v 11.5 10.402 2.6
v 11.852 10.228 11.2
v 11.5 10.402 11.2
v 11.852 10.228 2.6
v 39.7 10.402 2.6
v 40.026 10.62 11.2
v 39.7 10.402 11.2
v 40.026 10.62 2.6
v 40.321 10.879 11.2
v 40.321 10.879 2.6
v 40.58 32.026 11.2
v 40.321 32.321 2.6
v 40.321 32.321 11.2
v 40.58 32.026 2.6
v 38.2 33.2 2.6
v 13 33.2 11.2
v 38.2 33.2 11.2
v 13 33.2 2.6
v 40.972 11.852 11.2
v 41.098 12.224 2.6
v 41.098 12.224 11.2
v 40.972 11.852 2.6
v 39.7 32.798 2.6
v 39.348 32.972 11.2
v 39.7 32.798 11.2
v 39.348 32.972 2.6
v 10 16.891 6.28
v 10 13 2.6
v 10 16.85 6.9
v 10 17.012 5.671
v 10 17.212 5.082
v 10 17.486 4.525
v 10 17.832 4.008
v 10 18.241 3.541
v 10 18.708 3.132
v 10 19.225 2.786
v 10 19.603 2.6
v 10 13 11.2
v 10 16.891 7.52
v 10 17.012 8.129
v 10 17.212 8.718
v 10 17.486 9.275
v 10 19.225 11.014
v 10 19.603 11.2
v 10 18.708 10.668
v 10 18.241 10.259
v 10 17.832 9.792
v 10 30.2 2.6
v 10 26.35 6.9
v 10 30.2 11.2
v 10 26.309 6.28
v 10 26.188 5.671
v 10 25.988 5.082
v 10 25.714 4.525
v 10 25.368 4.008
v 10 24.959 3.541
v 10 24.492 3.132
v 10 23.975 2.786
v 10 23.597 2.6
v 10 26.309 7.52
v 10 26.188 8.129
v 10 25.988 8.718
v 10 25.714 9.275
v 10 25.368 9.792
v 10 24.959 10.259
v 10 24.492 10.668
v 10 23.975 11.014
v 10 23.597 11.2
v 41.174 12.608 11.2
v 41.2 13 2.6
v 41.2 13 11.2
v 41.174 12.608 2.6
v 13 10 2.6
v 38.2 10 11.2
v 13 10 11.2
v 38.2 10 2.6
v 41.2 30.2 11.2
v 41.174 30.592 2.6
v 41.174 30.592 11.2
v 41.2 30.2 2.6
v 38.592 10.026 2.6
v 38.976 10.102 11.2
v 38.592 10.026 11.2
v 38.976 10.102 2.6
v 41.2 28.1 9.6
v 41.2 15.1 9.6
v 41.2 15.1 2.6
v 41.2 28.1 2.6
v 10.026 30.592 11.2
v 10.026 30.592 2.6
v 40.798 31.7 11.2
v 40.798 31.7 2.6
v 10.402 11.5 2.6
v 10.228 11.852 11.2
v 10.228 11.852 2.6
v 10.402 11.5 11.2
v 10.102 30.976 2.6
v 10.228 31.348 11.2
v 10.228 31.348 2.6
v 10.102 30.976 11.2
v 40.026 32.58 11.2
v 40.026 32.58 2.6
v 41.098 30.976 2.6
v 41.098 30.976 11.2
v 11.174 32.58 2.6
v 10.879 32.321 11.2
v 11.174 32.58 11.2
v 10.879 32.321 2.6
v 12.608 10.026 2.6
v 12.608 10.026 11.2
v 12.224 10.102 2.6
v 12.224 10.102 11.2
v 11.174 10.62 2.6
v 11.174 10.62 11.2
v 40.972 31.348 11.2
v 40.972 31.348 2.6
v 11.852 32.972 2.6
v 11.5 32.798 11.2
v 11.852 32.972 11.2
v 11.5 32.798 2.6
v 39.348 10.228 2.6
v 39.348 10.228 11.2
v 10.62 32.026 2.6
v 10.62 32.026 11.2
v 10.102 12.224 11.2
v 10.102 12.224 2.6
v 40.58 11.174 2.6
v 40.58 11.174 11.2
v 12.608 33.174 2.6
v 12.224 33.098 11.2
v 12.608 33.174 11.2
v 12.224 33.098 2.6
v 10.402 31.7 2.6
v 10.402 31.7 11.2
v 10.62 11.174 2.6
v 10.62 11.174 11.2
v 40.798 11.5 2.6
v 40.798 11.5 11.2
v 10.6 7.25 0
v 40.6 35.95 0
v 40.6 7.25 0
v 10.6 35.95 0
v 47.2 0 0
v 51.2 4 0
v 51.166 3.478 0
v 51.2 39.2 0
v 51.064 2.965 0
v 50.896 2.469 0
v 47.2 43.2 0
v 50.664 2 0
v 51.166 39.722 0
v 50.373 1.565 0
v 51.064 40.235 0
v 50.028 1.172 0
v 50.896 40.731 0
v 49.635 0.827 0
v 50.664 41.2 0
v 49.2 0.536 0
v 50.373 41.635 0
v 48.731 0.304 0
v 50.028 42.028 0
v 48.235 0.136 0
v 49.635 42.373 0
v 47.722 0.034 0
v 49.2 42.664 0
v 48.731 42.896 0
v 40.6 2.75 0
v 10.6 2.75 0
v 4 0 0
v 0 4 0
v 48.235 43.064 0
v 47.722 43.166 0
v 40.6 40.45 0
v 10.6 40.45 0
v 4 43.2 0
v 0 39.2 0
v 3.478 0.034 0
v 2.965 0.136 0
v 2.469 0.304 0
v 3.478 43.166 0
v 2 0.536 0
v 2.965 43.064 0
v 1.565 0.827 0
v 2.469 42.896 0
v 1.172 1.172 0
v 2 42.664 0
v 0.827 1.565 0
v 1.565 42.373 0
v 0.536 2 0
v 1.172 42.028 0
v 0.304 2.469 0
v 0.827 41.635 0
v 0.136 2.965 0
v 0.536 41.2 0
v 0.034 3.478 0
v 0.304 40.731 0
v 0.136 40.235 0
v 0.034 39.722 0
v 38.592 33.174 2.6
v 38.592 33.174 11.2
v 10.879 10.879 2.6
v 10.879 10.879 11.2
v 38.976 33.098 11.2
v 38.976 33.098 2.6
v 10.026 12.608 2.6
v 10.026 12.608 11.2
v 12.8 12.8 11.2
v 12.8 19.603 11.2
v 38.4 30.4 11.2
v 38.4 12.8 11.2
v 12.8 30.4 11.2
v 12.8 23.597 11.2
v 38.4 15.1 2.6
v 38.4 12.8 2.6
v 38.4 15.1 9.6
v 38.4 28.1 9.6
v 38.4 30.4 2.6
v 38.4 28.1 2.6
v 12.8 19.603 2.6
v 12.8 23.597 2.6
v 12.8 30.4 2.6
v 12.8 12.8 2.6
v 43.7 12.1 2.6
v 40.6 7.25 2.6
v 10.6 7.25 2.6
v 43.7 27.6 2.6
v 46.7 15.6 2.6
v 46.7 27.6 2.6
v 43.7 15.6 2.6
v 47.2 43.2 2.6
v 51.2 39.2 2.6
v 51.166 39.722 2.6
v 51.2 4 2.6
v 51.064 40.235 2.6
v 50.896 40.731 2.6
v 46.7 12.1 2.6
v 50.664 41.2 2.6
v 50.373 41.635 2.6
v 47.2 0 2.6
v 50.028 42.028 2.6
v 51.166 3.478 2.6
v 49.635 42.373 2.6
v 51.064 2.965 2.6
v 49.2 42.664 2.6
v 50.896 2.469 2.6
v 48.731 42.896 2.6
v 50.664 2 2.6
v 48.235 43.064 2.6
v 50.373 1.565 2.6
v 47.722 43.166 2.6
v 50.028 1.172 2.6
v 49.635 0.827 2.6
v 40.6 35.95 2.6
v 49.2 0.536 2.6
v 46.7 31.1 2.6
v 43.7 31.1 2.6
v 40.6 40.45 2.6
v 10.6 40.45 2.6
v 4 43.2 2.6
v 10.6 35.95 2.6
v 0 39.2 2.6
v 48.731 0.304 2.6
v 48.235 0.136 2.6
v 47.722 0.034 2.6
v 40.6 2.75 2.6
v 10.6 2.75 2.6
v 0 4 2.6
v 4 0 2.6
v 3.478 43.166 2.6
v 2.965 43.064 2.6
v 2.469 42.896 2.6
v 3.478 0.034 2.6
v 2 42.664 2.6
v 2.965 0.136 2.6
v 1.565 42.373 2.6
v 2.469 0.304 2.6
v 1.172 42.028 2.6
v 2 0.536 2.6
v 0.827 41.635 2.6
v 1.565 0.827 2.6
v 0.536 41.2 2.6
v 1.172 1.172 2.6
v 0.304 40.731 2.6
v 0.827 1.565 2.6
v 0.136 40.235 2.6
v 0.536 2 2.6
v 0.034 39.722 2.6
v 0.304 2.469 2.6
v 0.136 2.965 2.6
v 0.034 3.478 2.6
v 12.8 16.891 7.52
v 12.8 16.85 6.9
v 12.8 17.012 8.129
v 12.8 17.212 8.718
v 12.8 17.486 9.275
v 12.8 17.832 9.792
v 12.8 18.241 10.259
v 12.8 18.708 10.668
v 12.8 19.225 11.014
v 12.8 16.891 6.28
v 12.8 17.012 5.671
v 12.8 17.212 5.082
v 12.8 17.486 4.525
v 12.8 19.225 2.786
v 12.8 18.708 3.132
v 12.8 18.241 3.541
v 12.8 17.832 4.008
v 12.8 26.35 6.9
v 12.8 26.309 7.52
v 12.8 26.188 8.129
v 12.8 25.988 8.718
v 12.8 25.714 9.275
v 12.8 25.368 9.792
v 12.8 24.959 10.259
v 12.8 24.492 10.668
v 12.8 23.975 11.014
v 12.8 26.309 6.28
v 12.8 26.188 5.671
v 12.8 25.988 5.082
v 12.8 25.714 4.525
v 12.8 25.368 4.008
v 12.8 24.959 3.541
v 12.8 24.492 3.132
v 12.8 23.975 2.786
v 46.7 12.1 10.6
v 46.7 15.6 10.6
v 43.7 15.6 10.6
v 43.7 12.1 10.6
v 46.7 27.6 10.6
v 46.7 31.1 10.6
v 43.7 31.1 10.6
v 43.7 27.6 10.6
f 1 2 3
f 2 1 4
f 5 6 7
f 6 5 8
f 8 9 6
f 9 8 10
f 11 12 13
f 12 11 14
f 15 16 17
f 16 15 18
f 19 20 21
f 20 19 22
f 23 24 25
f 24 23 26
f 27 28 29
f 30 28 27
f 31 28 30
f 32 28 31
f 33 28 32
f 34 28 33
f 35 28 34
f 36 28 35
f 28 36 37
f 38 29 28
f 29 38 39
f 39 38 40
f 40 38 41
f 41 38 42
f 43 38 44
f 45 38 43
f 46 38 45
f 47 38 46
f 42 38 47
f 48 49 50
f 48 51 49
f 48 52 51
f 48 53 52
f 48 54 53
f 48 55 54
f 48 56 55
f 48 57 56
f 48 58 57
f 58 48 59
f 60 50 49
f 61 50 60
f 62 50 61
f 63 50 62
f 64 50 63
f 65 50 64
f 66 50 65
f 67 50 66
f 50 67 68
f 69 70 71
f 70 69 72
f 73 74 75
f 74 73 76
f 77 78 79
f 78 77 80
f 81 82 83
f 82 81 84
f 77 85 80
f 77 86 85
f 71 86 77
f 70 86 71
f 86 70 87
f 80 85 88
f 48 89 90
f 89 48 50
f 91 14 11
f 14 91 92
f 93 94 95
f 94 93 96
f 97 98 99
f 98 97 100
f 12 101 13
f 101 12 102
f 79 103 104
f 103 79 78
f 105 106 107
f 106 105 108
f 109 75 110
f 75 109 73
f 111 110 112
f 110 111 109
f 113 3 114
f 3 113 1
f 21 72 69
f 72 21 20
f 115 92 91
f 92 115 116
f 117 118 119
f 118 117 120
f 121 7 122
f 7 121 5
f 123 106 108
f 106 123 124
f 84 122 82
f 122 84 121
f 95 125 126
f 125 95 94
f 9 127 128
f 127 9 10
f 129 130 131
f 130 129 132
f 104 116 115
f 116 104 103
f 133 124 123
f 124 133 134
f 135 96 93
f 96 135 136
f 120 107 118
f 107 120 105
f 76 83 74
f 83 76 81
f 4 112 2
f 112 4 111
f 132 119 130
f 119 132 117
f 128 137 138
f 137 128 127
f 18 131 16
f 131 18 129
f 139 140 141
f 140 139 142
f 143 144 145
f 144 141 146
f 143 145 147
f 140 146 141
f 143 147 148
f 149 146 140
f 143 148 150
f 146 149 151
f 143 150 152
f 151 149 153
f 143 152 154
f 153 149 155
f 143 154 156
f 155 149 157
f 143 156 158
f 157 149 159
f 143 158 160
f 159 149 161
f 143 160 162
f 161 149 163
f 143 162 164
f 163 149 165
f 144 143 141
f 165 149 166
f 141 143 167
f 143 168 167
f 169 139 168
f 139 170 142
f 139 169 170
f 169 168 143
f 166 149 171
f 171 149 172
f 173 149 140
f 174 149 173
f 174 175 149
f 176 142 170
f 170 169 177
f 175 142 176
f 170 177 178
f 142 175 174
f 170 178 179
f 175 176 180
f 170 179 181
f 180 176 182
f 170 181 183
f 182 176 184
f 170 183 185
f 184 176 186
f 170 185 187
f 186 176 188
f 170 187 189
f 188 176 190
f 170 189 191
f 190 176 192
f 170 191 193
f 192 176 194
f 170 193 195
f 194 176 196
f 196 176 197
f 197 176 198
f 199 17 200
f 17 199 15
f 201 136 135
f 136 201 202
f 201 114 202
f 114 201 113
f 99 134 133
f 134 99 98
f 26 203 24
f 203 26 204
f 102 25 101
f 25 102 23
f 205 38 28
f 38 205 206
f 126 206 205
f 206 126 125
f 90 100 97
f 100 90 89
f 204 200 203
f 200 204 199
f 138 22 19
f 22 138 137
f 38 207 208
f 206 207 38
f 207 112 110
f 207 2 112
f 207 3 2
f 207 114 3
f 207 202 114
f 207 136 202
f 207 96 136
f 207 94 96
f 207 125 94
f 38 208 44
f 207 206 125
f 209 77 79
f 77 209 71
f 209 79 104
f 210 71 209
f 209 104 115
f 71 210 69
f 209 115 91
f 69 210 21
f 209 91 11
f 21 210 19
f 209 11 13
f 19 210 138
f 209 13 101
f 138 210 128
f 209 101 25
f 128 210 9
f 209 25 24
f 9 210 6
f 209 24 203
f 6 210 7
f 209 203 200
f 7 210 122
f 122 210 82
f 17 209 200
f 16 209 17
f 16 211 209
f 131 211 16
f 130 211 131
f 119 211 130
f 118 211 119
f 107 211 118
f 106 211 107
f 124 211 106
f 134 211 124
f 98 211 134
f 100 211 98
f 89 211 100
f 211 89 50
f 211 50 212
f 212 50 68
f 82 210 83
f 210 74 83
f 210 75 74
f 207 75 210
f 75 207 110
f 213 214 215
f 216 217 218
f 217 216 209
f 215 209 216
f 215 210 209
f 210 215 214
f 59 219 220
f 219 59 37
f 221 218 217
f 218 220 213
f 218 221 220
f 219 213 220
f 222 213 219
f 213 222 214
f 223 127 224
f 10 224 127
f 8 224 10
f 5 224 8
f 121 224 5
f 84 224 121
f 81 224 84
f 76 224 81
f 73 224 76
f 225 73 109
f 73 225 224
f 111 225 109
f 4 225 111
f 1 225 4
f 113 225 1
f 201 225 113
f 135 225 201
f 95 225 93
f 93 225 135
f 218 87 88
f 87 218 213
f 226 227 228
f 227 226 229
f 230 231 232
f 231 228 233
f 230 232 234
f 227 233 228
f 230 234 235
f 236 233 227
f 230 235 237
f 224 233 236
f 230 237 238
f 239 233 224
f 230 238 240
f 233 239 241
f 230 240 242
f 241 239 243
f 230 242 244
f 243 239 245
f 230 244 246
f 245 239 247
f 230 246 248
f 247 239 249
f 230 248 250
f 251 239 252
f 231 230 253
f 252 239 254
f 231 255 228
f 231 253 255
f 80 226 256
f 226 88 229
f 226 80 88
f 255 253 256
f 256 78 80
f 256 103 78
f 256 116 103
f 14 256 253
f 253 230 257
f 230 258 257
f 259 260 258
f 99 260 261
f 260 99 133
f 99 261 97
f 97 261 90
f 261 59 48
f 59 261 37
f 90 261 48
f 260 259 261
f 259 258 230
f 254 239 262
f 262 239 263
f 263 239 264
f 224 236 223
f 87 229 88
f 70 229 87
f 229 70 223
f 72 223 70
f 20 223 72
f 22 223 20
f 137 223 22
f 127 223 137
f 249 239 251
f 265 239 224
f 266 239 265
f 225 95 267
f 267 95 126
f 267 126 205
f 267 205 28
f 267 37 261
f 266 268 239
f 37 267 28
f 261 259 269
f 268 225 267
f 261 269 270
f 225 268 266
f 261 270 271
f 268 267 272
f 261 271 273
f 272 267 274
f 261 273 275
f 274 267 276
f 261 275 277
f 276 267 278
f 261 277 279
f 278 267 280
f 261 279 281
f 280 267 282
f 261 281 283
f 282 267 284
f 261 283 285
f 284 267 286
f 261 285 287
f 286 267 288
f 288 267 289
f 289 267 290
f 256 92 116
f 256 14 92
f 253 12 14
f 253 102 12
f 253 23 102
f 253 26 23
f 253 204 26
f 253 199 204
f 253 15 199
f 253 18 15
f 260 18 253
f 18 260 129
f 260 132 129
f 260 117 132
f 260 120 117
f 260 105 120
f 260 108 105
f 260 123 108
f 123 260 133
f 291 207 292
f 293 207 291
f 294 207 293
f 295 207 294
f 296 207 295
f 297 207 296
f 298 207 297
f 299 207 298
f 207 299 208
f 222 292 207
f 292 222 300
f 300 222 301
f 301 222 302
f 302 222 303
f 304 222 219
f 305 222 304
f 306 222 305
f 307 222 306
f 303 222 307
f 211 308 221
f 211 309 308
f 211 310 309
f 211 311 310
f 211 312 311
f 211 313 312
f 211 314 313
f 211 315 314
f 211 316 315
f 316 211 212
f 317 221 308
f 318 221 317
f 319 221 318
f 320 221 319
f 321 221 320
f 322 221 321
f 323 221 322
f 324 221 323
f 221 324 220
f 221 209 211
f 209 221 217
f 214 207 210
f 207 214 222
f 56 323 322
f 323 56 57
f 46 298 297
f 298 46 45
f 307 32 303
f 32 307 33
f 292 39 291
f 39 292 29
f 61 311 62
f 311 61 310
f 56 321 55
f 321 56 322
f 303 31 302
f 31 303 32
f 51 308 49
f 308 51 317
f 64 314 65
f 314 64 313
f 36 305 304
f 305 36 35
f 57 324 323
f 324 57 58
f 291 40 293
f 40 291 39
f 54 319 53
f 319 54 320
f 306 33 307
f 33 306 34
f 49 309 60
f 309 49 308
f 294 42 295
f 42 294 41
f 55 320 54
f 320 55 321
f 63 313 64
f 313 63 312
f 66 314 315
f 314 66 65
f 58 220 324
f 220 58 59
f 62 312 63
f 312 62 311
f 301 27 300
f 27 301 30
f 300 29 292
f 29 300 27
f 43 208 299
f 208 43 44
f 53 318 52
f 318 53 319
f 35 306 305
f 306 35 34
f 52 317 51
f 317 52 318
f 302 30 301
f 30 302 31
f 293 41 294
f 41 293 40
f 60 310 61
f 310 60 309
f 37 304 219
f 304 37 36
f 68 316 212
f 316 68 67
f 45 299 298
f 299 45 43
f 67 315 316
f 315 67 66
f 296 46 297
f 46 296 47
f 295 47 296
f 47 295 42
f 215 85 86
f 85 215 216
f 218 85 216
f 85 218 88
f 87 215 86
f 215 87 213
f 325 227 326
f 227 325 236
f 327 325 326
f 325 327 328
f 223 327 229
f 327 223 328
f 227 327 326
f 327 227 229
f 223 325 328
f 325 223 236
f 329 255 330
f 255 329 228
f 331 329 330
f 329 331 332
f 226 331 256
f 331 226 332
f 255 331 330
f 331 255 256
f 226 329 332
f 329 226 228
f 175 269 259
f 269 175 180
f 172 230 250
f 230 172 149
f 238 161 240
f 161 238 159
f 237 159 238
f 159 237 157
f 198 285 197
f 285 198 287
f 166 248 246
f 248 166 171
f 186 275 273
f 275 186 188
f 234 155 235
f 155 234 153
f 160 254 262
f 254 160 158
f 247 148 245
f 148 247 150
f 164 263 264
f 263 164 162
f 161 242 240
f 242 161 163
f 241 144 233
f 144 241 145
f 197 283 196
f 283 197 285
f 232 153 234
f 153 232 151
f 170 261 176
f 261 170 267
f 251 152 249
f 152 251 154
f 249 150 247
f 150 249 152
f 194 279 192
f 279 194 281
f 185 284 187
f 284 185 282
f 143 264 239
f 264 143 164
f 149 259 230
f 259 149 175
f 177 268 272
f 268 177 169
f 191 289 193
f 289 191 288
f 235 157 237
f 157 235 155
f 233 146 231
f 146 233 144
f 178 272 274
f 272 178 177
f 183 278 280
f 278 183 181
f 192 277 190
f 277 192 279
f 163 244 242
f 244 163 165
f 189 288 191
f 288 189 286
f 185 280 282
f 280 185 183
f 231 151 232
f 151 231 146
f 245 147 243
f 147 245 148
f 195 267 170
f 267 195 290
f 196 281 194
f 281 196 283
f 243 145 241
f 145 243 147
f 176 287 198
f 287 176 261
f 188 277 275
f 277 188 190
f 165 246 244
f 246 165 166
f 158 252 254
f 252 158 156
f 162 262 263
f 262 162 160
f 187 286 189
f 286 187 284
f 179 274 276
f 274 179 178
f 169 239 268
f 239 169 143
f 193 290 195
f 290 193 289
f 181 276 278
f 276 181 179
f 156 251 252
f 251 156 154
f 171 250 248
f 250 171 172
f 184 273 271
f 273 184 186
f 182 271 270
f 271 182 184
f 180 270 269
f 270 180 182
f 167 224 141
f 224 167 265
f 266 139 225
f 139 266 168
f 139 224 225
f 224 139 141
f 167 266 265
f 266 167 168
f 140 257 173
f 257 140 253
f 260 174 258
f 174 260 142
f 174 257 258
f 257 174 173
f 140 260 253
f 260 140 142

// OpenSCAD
// ============================================================
//  CORVUS SENTINEL — Rugged SDR Cradle (parametric)
//  Holds a Nooelec NESDR Nano 3 and straps/zip-ties to your phone
//  or rugged case. Open shell + USB cable strain relief so a knock
//  on the antenna won't snap the phone's USB-C port.
//
//  USE: install OpenSCAD (free, openscad.org). Open this file.
//  VERIFY the three dongle dims below with calipers, press F6 to
//  render, then File > Export > Export as STL.
//  PRINT: TPU 95A (best impact resistance) or PETG. 3+ walls,
//  ~30% infill, no supports needed (open top).
// ============================================================

/* ---- 1) MEASURE YOUR DONGLE, in mm (online specs CONFLICT: ~25 vs 17 long) ---- */
dongle_len = 25;   // SDR BODY length, EXCLUDING the USB + SMA connectors
dongle_wid = 17;   // SDR body width
dongle_thk = 8;    // SDR body thickness

/* ---- 2) FIT + RUGGEDNESS ---- */
fit_gap   = 0.6;   // total slide-in clearance (raise if tight, lower if loose)
wall      = 2.8;   // wall thickness (higher = tougher)
base      = 2.6;   // floor thickness
corner_r  = 3;     // outer corner radius
$fn       = 48;

/* ---- 3) CONNECTOR OPENINGS ---- */
sma_dia   = 9.5;   // antenna (SMA) connector clearance, -X end
usb_wid   = 13;    // USB-C plug + cable opening width, +X end
usb_hgt   = 7;     // USB-C plug + cable opening height

/* ---- 4) STRAP / ZIP-TIE MOUNT ---- */
plate_margin = 10; // flat margin around cradle holding the strap slots
slot_len     = 30; // strap/zip-tie slot length (along the body)
slot_wid     = 4.5;// strap/zip-tie slot width (strap thickness + a little)

/* ================= derived ================= */
cav_l = dongle_len + fit_gap;
cav_w = dongle_wid + fit_gap;
cav_h = dongle_thk + fit_gap;
crad_l = cav_l + 2 * wall;
crad_w = cav_w + 2 * wall;
crad_h = cav_h;
plate_l = crad_l + 2 * plate_margin;
plate_w = crad_w + 2 * plate_margin;

module rbox(l, w, h, r) {
  hull() for (x = [r, l - r], y = [r, w - r])
    translate([x, y, 0]) cylinder(h = h, r = r);
}

module cradle() {
  difference() {
    rbox(crad_l, crad_w, base + crad_h, corner_r);
    // dongle pocket — open top, no supports
    translate([wall, wall, base]) cube([cav_l, cav_w, crad_h + 1]);
    // SMA / antenna hole through the -X end wall
    translate([-1, crad_w / 2, base + cav_h / 2])
      rotate([0, 90, 0]) cylinder(h = wall + 2, d = sma_dia);
    // USB-C + cable opening through the +X end wall
    translate([crad_l - wall - 1, crad_w / 2 - usb_wid / 2, base])
      cube([wall + 2, usb_wid, usb_hgt]);
  }
}

module cable_relief() {
  // two posts just past the USB end: route the cable between them and
  // cinch a small zip-tie around it so bending load stays on the cradle.
  for (y = [crad_w / 2 - usb_wid / 2 - 3, crad_w / 2 + usb_wid / 2 - 0.5])
    translate([crad_l + 2.5, y, 0]) cube([3, 3.5, base + 8]);
}

difference() {
  union() {
    rbox(plate_l, plate_w, base, corner_r + 1);                 // baseplate
    translate([plate_margin, plate_margin, 0]) cradle();        // cradle
    translate([plate_margin, plate_margin, 0]) cable_relief();  // strain relief
  }
  // strap / zip-tie slots: one on each long side (wrap around the phone)
  for (sy = [plate_margin / 2 - slot_wid / 2,
             plate_w - plate_margin / 2 - slot_wid / 2])
    translate([plate_l / 2 - slot_len / 2, sy, -1])
      cube([slot_len, slot_wid, base + 2]);
}
